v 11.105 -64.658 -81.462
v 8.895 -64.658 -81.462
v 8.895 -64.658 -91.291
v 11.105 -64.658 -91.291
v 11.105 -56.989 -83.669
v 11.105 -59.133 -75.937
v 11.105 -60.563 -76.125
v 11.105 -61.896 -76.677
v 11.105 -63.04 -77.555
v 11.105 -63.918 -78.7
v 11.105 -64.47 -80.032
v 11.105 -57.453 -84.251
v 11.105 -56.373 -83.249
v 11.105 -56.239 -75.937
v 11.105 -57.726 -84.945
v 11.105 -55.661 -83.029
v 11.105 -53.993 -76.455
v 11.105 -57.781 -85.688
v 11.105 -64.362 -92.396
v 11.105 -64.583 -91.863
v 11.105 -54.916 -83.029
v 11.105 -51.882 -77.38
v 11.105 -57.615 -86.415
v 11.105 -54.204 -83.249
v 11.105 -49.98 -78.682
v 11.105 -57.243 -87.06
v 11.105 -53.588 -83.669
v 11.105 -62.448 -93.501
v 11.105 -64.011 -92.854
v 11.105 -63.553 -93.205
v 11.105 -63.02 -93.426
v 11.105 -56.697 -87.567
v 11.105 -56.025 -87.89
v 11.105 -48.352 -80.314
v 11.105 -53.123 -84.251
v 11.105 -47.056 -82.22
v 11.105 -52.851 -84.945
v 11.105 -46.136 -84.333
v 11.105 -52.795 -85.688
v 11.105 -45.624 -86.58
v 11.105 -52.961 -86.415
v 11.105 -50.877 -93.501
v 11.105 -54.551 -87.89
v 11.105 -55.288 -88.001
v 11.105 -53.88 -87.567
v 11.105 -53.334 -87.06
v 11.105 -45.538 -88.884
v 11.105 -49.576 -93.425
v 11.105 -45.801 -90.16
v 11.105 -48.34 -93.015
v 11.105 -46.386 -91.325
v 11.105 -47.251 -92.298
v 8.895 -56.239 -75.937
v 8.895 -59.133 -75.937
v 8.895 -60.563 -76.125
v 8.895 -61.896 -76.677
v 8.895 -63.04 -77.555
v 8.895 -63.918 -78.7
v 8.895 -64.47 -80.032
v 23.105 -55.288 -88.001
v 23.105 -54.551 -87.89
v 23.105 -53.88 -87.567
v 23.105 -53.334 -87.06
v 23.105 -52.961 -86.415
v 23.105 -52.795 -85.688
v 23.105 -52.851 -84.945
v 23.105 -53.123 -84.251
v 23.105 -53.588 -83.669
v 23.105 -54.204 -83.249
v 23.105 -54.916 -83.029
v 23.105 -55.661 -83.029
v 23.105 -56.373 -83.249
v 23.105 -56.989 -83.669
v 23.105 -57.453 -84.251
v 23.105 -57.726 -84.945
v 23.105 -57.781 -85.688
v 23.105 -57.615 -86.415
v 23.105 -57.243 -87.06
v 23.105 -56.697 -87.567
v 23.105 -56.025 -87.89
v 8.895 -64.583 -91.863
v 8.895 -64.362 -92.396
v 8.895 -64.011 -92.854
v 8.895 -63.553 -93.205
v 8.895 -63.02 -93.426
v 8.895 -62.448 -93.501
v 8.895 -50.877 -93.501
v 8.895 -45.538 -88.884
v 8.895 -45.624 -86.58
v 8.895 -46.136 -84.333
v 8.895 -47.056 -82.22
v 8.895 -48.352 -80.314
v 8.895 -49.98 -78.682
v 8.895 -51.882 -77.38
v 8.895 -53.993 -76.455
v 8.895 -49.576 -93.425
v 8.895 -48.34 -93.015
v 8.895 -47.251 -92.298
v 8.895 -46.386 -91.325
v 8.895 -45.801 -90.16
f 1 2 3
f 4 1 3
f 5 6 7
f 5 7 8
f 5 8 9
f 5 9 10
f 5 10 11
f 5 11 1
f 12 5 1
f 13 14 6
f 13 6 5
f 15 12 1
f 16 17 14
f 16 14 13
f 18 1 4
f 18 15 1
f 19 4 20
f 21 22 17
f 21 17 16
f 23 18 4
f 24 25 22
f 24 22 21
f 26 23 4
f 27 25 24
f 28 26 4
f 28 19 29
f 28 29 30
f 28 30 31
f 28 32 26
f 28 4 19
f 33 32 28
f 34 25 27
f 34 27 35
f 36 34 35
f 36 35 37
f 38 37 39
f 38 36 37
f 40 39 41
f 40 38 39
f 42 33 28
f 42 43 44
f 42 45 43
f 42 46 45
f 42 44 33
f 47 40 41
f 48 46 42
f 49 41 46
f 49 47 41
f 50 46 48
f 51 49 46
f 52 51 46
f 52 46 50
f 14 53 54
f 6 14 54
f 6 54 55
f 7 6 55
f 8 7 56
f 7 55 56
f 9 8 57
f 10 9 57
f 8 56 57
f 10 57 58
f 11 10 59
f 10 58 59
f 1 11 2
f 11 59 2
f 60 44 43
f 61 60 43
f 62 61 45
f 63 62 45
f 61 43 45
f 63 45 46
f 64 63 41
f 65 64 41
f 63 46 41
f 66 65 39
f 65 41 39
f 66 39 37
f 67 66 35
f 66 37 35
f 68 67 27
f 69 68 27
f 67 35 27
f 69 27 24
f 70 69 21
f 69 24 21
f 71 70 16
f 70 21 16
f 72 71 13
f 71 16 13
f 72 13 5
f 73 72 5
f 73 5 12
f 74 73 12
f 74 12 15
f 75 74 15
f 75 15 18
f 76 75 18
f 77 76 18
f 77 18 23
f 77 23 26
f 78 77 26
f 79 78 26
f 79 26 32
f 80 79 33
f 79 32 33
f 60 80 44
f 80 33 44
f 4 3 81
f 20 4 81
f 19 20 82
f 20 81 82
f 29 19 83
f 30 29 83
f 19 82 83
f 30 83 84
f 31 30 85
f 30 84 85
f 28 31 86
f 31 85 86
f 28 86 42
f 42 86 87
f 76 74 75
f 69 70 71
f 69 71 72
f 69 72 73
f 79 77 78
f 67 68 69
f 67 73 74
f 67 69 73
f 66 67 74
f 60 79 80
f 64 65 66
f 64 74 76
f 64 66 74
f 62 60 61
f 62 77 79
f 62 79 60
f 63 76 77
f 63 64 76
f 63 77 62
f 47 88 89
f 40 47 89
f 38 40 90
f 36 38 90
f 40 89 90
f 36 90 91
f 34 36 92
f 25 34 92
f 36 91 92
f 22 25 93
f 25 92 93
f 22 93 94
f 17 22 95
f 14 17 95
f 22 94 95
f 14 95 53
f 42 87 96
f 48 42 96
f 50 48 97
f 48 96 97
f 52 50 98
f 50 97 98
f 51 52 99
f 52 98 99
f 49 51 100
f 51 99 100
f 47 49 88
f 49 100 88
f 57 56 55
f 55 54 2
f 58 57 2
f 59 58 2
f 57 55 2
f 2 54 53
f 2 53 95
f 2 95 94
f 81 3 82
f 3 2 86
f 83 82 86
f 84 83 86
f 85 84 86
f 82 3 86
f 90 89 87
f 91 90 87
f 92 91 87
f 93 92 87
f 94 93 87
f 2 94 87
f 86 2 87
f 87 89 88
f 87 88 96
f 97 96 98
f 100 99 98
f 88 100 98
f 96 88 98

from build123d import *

# Parameters (mm, degrees)
BOSS_EXTRUDE1_DEPTH = 20
SCALE1_SCALE        = 0.110510806
SKETCH4_R           = 2.5
BOSS_EXTRUDE2_DEPTH = 12


with BuildPart() as part:
    # Sketch3 → Boss-Extrude1 (new body)
    with BuildSketch(Plane(origin=(0, 0, 0), x_dir=(0, 0, -1), z_dir=(1, 0, 0))):
        with BuildLine():
            Line((0, -60), (0, -86.184781703))
            ThreePointArc((0, -86.184781703), (14.644660941, -121.540120762), (50, -136.184781703))
            Line((50, -136.184781703), (59.297038535, -136.184781703))
            Line((59.297038535, -136.184781703), (138.939006392, -136.184781703))
            ThreePointArc((138.939006392, -136.184781703), (153.081142016, -130.326917326), (158.939006392, -116.184781703))
            Line((158.939006392, -116.184781703), (158.939006392, -50))
            Line((158.939006392, -50), (158.939006392, -11.480346054))
            ThreePointArc((158.939006392, -11.480346054), (148.053108697, 21.328755123), (117.156078712, 36.830801017))
            ThreePointArc((117.156078712, 36.830801017), (39.60735059, 11.368133348), (0, -60))
        make_face()
    extrude(amount=BOSS_EXTRUDE1_DEPTH)


with BuildPart() as part_1:
    # Scale1: scaled about (10, -55.771836123, -85.371281571)
    add(part.part.scale(SCALE1_SCALE).moved(Location((8.89489194, -49.608445561, -75.936832435))))

    # Sketch4 → Boss-Extrude2 (add)
    with BuildSketch(Plane(origin=(11.10510806, 0, 0), x_dir=(0, 0, -1), z_dir=(1, 0, 0))):
        with Locations((85.501310137, -55.288244055)):
            Circle(SKETCH4_R)
    extrude(amount=BOSS_EXTRUDE2_DEPTH)


solid = part_1.part
